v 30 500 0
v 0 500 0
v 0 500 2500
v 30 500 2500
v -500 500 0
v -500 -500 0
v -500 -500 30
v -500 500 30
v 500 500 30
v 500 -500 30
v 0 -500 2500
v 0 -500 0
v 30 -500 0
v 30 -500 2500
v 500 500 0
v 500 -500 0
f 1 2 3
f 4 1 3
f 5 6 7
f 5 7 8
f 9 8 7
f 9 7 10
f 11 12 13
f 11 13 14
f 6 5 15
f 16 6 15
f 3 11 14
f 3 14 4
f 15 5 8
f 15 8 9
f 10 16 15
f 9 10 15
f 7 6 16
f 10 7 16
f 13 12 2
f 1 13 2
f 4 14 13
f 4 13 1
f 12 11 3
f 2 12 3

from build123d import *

# Parameters (mm, degrees)
SKETCH001_W  = 1000
SKETCH001_H  = 2500
PAD_DEPTH    = 30
SKETCH002_W  = 1000
SKETCH002_H  = 1000
PAD001_DEPTH = 30


with BuildPart() as sidebody:
    # Sketch001 → Pad (new body)
    with BuildSketch(Plane.YZ):
        with Locations((0, 1250)):
            Rectangle(SKETCH001_W, SKETCH001_H)
    extrude(amount=PAD_DEPTH)


with BuildPart() as shelfbody:
    # Sketch002 → Pad001 (new body)
    with BuildSketch(Plane.XY):
        Rectangle(SKETCH002_W, SKETCH002_H)
    extrude(amount=PAD001_DEPTH)


solid = Compound([sidebody.part, shelfbody.part])
